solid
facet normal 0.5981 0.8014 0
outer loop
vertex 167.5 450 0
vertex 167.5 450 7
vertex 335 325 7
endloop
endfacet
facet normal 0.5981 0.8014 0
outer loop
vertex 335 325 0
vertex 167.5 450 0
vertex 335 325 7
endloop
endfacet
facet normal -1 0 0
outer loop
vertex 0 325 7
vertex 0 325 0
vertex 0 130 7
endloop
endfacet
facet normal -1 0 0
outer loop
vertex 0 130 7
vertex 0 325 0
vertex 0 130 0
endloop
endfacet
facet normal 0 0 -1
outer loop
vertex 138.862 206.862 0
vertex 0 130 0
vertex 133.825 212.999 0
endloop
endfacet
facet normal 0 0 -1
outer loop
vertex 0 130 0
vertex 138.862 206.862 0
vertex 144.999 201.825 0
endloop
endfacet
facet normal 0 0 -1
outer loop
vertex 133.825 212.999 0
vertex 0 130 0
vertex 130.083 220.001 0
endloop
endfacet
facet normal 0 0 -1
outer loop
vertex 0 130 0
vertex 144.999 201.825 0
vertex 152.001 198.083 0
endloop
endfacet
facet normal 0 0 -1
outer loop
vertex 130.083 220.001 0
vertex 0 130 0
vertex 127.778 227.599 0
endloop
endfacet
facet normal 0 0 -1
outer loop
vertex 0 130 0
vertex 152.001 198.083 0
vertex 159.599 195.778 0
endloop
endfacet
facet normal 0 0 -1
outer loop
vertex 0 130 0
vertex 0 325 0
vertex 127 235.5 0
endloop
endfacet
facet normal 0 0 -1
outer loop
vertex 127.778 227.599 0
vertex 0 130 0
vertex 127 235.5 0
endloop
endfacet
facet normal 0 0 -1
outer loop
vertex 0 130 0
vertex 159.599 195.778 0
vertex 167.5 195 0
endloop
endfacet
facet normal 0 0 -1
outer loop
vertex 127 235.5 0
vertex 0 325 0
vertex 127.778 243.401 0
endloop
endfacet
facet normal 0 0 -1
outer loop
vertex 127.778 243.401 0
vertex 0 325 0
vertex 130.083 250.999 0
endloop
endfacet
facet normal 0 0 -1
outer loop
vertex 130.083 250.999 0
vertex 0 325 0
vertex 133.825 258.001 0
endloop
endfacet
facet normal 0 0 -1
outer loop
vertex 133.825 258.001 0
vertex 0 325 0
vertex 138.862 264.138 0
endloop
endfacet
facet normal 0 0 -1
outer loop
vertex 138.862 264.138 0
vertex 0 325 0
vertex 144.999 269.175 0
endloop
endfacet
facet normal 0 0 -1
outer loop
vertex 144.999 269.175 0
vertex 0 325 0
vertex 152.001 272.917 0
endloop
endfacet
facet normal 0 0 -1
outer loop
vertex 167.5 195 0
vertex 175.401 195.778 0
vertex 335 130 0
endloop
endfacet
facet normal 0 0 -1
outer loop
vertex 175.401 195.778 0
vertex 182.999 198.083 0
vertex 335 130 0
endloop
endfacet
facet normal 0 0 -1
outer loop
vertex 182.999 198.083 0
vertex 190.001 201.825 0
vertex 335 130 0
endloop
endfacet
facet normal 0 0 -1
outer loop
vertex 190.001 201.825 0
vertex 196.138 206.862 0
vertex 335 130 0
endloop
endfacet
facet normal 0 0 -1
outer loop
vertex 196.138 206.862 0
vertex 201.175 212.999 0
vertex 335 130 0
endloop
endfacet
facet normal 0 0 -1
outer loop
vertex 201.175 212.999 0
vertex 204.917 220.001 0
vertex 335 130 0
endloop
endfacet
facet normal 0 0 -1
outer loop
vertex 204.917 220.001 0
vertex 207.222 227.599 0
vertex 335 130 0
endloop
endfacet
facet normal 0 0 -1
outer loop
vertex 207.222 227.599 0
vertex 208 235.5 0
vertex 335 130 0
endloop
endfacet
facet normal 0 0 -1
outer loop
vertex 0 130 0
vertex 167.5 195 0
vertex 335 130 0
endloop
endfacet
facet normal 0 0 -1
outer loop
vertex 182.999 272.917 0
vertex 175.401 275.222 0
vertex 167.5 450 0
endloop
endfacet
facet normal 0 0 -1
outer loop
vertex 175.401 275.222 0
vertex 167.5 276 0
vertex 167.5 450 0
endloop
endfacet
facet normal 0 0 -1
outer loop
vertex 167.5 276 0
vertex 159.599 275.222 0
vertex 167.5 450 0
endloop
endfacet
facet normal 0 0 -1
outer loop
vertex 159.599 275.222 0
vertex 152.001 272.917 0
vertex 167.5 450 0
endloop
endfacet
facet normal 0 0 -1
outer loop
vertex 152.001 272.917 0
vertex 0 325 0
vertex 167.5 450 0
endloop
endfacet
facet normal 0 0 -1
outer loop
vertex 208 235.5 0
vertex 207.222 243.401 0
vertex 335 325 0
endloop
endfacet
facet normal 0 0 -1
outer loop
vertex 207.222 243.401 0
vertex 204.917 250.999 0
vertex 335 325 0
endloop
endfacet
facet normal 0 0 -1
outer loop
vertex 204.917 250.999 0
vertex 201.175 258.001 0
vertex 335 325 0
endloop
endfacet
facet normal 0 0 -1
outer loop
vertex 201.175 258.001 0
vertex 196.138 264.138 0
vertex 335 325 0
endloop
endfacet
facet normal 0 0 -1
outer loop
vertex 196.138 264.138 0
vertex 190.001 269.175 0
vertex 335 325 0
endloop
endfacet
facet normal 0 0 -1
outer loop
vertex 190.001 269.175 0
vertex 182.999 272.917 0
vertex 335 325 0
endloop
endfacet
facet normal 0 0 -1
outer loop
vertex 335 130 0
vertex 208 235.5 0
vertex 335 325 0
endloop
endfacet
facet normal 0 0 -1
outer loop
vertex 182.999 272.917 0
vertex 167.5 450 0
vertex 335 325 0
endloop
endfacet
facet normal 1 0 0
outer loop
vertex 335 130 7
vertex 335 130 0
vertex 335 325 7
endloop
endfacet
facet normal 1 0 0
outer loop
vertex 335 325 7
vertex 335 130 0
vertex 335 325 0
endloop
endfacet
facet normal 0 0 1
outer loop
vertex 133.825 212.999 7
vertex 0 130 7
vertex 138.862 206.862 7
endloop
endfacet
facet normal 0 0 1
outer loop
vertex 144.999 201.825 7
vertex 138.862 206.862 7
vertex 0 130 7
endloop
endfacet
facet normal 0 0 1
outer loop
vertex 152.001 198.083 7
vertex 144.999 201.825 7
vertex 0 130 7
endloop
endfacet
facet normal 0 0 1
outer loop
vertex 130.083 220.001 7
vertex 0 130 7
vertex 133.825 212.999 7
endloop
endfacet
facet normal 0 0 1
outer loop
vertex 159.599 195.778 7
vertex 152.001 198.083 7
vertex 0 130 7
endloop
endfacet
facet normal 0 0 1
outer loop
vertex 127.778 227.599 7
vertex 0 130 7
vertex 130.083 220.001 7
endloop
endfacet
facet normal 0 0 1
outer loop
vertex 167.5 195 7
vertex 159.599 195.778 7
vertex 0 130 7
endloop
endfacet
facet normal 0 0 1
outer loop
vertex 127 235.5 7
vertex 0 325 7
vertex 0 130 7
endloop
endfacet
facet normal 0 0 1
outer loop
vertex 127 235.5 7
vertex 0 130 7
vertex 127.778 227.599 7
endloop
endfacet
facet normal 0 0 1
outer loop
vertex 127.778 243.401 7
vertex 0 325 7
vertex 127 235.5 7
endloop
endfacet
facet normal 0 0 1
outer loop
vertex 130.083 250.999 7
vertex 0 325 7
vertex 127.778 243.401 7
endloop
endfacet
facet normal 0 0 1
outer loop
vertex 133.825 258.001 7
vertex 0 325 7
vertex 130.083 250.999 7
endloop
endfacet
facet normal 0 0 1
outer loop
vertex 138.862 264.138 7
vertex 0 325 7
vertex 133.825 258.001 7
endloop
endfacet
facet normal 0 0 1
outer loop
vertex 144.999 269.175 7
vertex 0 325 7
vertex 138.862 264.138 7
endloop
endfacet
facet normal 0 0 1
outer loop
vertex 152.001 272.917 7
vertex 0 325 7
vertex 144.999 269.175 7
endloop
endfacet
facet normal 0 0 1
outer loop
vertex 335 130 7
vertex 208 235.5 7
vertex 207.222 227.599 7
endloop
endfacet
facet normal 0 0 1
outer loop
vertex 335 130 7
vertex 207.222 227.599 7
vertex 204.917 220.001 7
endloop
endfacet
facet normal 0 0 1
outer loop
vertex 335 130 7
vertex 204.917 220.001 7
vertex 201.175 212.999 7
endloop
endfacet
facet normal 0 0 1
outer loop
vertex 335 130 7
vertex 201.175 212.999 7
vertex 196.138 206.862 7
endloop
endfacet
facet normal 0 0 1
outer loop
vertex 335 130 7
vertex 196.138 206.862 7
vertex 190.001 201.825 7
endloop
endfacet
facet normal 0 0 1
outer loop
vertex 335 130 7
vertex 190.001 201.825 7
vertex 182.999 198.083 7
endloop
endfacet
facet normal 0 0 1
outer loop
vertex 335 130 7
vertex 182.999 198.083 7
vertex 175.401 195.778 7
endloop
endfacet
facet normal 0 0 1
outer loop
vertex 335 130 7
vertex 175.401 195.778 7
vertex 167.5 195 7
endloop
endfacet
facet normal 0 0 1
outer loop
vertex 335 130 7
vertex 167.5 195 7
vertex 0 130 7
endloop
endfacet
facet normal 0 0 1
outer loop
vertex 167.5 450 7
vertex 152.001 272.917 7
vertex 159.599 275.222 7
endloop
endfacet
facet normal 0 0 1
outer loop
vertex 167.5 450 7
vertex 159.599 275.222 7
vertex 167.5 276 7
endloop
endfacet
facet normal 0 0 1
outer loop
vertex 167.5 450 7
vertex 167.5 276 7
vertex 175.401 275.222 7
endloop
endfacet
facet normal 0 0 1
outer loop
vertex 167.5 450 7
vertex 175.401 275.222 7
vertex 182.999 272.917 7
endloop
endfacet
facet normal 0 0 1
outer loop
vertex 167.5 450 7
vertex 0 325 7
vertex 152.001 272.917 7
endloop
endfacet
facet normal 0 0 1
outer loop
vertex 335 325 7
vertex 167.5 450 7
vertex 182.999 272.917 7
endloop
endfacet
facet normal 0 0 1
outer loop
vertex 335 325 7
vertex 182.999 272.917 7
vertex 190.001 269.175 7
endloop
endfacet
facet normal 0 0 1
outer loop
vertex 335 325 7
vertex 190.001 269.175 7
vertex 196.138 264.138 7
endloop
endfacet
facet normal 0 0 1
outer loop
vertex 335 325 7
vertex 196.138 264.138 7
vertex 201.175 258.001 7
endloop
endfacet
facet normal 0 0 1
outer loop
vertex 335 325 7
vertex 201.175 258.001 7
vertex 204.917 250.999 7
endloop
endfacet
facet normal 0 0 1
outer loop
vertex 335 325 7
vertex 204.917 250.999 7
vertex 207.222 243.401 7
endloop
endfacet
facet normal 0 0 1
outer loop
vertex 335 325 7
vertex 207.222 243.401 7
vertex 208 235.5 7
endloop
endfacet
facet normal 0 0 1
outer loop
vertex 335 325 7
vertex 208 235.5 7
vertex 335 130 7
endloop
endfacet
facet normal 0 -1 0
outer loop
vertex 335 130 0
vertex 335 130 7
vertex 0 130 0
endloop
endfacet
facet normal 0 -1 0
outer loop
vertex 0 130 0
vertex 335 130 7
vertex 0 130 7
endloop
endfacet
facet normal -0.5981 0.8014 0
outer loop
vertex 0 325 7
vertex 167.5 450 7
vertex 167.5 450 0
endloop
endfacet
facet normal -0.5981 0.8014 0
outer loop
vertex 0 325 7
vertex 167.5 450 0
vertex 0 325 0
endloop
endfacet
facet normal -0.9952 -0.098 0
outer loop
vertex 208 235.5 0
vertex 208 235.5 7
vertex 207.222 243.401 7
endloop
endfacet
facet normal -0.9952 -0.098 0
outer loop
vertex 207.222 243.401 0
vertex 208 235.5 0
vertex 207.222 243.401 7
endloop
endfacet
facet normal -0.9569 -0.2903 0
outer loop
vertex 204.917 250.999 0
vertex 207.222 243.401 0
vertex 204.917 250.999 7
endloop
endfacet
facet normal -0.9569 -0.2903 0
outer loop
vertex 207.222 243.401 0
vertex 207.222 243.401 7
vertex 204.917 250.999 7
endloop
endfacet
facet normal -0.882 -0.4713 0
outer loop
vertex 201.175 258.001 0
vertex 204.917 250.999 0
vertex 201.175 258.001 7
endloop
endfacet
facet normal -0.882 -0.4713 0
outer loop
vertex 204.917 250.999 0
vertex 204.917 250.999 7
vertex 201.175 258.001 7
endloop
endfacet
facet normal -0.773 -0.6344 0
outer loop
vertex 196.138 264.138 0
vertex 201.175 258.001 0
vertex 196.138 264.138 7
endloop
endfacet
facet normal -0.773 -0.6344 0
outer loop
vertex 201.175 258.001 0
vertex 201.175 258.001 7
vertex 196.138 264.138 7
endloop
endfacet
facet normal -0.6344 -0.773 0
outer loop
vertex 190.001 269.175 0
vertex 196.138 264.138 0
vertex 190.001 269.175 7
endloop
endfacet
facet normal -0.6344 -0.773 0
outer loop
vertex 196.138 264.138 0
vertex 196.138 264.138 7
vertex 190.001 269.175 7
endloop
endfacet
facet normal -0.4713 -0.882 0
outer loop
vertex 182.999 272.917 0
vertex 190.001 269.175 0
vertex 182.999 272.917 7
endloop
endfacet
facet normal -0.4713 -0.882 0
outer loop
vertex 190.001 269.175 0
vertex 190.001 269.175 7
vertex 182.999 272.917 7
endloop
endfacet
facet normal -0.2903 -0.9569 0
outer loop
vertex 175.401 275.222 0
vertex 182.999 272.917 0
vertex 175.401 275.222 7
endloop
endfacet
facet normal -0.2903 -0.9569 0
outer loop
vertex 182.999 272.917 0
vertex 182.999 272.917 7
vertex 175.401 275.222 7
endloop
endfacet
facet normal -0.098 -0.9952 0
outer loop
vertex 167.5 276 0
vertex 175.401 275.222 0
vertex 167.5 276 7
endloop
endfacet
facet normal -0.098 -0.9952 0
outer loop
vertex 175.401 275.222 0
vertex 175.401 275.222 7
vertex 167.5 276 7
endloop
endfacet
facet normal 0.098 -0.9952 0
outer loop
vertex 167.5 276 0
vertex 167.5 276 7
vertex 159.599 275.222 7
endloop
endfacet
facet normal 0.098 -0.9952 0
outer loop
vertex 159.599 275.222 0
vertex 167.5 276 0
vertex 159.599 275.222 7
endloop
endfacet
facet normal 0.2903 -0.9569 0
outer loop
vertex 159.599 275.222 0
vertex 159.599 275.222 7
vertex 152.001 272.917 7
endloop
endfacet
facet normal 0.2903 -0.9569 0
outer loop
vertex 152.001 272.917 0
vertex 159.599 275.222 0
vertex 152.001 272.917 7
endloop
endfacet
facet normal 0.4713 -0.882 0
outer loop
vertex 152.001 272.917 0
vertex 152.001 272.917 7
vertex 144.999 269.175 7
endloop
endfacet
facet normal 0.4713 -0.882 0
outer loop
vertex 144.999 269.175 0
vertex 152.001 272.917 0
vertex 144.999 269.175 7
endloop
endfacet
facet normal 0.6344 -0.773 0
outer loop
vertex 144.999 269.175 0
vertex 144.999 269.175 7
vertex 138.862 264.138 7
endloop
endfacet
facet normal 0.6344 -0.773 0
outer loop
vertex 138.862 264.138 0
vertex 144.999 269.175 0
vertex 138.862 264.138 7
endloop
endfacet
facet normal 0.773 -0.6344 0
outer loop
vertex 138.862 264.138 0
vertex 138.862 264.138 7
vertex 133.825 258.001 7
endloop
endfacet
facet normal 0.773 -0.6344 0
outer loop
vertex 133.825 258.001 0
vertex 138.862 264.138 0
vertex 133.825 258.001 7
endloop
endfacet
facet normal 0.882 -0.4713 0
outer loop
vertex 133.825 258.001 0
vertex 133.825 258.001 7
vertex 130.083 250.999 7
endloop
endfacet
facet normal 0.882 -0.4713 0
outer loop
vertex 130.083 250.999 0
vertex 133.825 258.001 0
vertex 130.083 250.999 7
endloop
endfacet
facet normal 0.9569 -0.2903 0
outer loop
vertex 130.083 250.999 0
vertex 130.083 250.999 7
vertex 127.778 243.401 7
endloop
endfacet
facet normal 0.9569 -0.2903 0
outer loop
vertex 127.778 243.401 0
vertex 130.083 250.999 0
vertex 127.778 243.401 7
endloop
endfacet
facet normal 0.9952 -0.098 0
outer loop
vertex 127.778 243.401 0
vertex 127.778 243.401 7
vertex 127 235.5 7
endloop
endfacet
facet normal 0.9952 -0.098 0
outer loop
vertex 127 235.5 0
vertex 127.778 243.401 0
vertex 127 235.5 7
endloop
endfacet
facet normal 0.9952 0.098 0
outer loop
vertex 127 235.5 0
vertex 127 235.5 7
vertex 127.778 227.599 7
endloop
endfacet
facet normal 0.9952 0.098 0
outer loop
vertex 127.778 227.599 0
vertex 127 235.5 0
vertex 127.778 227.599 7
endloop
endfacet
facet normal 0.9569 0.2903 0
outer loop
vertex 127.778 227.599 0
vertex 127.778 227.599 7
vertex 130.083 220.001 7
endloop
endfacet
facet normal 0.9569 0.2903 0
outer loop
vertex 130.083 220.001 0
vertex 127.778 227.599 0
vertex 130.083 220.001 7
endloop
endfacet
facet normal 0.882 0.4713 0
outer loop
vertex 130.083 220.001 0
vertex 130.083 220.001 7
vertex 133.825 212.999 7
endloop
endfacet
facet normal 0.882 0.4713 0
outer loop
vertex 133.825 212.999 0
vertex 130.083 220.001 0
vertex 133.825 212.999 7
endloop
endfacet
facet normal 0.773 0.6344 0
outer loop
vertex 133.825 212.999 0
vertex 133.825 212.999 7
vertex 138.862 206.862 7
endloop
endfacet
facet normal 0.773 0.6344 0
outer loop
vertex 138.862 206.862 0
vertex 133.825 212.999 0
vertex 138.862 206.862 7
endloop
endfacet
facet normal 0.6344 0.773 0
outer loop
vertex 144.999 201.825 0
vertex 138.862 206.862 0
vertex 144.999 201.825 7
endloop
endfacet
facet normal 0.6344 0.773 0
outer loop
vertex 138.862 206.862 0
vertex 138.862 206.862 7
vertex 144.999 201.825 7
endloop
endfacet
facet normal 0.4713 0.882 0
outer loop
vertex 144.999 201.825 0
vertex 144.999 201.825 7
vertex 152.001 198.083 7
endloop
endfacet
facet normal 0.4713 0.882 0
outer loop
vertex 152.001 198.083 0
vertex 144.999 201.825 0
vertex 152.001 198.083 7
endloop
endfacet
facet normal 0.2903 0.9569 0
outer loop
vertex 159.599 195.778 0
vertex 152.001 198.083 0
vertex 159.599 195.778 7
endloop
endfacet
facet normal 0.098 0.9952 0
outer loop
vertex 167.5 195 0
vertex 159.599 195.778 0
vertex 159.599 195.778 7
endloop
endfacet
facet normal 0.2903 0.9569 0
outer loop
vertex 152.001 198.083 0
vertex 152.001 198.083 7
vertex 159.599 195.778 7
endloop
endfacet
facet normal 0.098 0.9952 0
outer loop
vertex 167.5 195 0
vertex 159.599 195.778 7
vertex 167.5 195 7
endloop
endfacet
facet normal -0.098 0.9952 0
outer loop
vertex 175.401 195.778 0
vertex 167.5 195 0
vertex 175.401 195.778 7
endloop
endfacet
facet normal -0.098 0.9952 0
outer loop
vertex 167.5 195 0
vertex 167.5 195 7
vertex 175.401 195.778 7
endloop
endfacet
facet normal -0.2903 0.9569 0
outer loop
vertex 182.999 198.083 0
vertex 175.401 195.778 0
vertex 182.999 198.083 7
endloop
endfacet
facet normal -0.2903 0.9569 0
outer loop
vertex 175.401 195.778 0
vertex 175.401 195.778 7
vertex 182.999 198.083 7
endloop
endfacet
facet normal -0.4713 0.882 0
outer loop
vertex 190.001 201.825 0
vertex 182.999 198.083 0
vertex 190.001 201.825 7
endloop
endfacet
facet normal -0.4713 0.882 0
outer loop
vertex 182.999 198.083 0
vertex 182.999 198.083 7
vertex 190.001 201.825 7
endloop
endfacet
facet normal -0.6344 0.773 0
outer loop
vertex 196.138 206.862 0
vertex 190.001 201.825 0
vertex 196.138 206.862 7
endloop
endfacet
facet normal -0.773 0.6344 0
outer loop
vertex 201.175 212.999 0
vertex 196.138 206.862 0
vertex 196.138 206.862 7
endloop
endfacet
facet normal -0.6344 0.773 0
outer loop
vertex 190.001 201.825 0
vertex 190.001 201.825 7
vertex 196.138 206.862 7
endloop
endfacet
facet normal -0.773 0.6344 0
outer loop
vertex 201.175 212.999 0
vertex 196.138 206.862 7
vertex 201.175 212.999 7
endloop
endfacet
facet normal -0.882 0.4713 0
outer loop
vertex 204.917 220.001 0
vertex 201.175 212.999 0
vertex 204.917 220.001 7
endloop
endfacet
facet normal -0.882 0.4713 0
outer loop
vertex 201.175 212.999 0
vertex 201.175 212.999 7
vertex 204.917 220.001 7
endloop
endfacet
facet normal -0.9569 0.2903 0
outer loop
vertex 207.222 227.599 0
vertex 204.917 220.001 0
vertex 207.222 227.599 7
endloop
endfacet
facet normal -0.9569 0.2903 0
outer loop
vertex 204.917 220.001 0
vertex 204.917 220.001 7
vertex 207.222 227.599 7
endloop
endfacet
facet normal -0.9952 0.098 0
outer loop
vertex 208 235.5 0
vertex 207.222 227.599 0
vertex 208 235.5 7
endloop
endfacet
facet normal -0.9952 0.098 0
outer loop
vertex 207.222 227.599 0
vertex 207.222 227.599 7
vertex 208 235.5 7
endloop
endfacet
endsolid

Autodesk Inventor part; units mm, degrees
ref_plane "YZ Plane" through (0, 0, 0) normal (1, 0, 0) x (0, 1, 0)
ref_plane "XZ Plane" through (0, 0, 0) normal (0, 1, 0) x (-1, 0, 0)
ref_plane "XY Plane" through (0, 0, 0) normal (0, 0, 1) x (1, 0, 0)
sketch "Sketch1" plane through (0, 0, 0) normal (0, 0, 1) x (1, 0, 0)
  point P0 (0, 0)
sketch "Sketch2" plane through (0, 0, 0) normal (0, 0, 1) x (1, 0, 0)
  line L0 (0, 0) -> (335, 0)
  line L1 (335, 0) -> (335, 450)
  line L2 (335, 450) -> (0, 450)
  line L3 (0, 450) -> (0, 0)
  line L4 (0, 0) -> (167.5, 0)
  dimension "d0" = 335
  dimension "d1" = 450
  dimension "d2" = 167.5
extrude "Extrusion1" add sketch "Sketch2" along normal blind 7
sketch "Sketch3" plane through (0, 0, 7) normal (0, 0, 1) x (1, 0, 0)
  line L0 (0, 0) -> (167.5, 0)
  line L1 (0, 0) -> (335, 0) projected
  line L2 (167.5, 0) -> (167.5, 450)
  line L3 (335, 450) -> (0, 450) projected
  line L4 (0, 0) -> (0, 325)
  line L5 (0, 450) -> (0, 0) projected
  line L6 (0, 325) -> (335, 325)
  line L7 (335, 0) -> (335, 450) projected
  line L8 (335, 325) -> (167.5, 450)
  line L9 (167.5, 450) -> (0, 325)
  dimension "d5" = 167.5
  dimension "d6" = 325
extrude "Extrusion2" cut sketch "Sketch3" against normal blind 166.0375 contours L5 L3 L9
sketch "Sketch5" plane through (0, 0, 7) normal (0, 0, 1) x (1, 0, 0)
  line L0 (167.5, 450) -> (335, 450)
  line L1 (335, 450) -> (167.5, 450) projected
  line L2 (335, 450) -> (335, 0)
  line L3 (335, 0) -> (335, 450) projected
  line L4 (335, 0) -> (335, 325)
  line L5 (167.5, 450) -> (335, 325)
  line L6 (335, 450) -> (167.5, 450)
  line L7 (335, 325) -> (335, 450)
  point P0 (0, 0)
  dimension "d10" = 325
extrude "Extrusion3" cut sketch "Sketch5" against normal blind 305.45
sketch "Sketch6" plane through (0, 0, 7) normal (0, 0, 1) x (1, 0, 0)
  point P0 (0, 0)
sketch "Sketch7" plane through (0, 0, 7) normal (0, 0, 1) x (1, 0, 0)
  point P0 (0, 0)
sketch "Sketch8" plane through (0, 0, 7) normal (0, 0, 1) x (1, 0, 0)
  point P0 (0, 0)
sketch "Sketch9" plane through (0, 0, 7) normal (0, 0, 1) x (1, 0, 0)
  point P0 (0, 0)
sketch "Sketch12" plane through (0, 0, 7) normal (0, 0, 1) x (1, 0, 0)
  line L0 (207.5, 195) -> (127.5, 195) projected
  line L1 (167.5, 0) -> (207.5, 0)
  line L2 (0, 0) -> (335, 0) projected
  line L3 (207.5, 0) -> (127.5, 0)
  line L4 (207.5, 0) -> (207.5, 130)
  line L5 (127.5, 0) -> (207.5, 0)
  line L6 (207.5, 0) -> (207.5, 130)
  line L7 (207.5, 130) -> (127.5, 130)
  line L8 (127.5, 130) -> (127.5, 0)
  dimension "d25" = 40
  dimension "d26" = 80
  dimension "d27" = 130
extrude "Extrusion6" cut sketch "Sketch12" against normal blind 10
sketch "Sketch13" plane through (0, 0, 7) normal (0, 0, 1) x (1, 0, 0)
  line L0 (167.5, 450) -> (167.5, 0)
  line L1 (0, 0) -> (127.5, 0) projected
  line L2 (0, 325) -> (335, 325)
  line L3 (335, 0) -> (335, 325) projected
  line L4 (127.5, 130) -> (207.5, 130) projected
  line L5 (167.5, 130) -> (167.5, 195)
  line L6 (167.5, 195) -> (167.5, 235.5)
  line L7 (167.5, 235.5) -> (167.5, 276)
  circle A0 centre (167.5, 235.5) radius 40.5
  dimension "d30" = 65
  dimension "d31" = 40.5
  dimension "d32" = 40.5
extrude "Extrusion7" cut sketch "Sketch13" against normal blind 10
sketch "Sketch18" plane through (0, 0, 7) normal (0, 0, 1) x (1, 0, 0)
  line L0 (0, 0) -> (335, 0)
  line L1 (335, 0) -> (335, 130)
  line L2 (335, 130) -> (0, 130)
  line L3 (0, 130) -> (0, 0)
  dimension "d43" = 335
  dimension "d44" = 130
extrude "Extrusion10" cut sketch "Sketch18" against normal blind 10
properties part number "frente"
